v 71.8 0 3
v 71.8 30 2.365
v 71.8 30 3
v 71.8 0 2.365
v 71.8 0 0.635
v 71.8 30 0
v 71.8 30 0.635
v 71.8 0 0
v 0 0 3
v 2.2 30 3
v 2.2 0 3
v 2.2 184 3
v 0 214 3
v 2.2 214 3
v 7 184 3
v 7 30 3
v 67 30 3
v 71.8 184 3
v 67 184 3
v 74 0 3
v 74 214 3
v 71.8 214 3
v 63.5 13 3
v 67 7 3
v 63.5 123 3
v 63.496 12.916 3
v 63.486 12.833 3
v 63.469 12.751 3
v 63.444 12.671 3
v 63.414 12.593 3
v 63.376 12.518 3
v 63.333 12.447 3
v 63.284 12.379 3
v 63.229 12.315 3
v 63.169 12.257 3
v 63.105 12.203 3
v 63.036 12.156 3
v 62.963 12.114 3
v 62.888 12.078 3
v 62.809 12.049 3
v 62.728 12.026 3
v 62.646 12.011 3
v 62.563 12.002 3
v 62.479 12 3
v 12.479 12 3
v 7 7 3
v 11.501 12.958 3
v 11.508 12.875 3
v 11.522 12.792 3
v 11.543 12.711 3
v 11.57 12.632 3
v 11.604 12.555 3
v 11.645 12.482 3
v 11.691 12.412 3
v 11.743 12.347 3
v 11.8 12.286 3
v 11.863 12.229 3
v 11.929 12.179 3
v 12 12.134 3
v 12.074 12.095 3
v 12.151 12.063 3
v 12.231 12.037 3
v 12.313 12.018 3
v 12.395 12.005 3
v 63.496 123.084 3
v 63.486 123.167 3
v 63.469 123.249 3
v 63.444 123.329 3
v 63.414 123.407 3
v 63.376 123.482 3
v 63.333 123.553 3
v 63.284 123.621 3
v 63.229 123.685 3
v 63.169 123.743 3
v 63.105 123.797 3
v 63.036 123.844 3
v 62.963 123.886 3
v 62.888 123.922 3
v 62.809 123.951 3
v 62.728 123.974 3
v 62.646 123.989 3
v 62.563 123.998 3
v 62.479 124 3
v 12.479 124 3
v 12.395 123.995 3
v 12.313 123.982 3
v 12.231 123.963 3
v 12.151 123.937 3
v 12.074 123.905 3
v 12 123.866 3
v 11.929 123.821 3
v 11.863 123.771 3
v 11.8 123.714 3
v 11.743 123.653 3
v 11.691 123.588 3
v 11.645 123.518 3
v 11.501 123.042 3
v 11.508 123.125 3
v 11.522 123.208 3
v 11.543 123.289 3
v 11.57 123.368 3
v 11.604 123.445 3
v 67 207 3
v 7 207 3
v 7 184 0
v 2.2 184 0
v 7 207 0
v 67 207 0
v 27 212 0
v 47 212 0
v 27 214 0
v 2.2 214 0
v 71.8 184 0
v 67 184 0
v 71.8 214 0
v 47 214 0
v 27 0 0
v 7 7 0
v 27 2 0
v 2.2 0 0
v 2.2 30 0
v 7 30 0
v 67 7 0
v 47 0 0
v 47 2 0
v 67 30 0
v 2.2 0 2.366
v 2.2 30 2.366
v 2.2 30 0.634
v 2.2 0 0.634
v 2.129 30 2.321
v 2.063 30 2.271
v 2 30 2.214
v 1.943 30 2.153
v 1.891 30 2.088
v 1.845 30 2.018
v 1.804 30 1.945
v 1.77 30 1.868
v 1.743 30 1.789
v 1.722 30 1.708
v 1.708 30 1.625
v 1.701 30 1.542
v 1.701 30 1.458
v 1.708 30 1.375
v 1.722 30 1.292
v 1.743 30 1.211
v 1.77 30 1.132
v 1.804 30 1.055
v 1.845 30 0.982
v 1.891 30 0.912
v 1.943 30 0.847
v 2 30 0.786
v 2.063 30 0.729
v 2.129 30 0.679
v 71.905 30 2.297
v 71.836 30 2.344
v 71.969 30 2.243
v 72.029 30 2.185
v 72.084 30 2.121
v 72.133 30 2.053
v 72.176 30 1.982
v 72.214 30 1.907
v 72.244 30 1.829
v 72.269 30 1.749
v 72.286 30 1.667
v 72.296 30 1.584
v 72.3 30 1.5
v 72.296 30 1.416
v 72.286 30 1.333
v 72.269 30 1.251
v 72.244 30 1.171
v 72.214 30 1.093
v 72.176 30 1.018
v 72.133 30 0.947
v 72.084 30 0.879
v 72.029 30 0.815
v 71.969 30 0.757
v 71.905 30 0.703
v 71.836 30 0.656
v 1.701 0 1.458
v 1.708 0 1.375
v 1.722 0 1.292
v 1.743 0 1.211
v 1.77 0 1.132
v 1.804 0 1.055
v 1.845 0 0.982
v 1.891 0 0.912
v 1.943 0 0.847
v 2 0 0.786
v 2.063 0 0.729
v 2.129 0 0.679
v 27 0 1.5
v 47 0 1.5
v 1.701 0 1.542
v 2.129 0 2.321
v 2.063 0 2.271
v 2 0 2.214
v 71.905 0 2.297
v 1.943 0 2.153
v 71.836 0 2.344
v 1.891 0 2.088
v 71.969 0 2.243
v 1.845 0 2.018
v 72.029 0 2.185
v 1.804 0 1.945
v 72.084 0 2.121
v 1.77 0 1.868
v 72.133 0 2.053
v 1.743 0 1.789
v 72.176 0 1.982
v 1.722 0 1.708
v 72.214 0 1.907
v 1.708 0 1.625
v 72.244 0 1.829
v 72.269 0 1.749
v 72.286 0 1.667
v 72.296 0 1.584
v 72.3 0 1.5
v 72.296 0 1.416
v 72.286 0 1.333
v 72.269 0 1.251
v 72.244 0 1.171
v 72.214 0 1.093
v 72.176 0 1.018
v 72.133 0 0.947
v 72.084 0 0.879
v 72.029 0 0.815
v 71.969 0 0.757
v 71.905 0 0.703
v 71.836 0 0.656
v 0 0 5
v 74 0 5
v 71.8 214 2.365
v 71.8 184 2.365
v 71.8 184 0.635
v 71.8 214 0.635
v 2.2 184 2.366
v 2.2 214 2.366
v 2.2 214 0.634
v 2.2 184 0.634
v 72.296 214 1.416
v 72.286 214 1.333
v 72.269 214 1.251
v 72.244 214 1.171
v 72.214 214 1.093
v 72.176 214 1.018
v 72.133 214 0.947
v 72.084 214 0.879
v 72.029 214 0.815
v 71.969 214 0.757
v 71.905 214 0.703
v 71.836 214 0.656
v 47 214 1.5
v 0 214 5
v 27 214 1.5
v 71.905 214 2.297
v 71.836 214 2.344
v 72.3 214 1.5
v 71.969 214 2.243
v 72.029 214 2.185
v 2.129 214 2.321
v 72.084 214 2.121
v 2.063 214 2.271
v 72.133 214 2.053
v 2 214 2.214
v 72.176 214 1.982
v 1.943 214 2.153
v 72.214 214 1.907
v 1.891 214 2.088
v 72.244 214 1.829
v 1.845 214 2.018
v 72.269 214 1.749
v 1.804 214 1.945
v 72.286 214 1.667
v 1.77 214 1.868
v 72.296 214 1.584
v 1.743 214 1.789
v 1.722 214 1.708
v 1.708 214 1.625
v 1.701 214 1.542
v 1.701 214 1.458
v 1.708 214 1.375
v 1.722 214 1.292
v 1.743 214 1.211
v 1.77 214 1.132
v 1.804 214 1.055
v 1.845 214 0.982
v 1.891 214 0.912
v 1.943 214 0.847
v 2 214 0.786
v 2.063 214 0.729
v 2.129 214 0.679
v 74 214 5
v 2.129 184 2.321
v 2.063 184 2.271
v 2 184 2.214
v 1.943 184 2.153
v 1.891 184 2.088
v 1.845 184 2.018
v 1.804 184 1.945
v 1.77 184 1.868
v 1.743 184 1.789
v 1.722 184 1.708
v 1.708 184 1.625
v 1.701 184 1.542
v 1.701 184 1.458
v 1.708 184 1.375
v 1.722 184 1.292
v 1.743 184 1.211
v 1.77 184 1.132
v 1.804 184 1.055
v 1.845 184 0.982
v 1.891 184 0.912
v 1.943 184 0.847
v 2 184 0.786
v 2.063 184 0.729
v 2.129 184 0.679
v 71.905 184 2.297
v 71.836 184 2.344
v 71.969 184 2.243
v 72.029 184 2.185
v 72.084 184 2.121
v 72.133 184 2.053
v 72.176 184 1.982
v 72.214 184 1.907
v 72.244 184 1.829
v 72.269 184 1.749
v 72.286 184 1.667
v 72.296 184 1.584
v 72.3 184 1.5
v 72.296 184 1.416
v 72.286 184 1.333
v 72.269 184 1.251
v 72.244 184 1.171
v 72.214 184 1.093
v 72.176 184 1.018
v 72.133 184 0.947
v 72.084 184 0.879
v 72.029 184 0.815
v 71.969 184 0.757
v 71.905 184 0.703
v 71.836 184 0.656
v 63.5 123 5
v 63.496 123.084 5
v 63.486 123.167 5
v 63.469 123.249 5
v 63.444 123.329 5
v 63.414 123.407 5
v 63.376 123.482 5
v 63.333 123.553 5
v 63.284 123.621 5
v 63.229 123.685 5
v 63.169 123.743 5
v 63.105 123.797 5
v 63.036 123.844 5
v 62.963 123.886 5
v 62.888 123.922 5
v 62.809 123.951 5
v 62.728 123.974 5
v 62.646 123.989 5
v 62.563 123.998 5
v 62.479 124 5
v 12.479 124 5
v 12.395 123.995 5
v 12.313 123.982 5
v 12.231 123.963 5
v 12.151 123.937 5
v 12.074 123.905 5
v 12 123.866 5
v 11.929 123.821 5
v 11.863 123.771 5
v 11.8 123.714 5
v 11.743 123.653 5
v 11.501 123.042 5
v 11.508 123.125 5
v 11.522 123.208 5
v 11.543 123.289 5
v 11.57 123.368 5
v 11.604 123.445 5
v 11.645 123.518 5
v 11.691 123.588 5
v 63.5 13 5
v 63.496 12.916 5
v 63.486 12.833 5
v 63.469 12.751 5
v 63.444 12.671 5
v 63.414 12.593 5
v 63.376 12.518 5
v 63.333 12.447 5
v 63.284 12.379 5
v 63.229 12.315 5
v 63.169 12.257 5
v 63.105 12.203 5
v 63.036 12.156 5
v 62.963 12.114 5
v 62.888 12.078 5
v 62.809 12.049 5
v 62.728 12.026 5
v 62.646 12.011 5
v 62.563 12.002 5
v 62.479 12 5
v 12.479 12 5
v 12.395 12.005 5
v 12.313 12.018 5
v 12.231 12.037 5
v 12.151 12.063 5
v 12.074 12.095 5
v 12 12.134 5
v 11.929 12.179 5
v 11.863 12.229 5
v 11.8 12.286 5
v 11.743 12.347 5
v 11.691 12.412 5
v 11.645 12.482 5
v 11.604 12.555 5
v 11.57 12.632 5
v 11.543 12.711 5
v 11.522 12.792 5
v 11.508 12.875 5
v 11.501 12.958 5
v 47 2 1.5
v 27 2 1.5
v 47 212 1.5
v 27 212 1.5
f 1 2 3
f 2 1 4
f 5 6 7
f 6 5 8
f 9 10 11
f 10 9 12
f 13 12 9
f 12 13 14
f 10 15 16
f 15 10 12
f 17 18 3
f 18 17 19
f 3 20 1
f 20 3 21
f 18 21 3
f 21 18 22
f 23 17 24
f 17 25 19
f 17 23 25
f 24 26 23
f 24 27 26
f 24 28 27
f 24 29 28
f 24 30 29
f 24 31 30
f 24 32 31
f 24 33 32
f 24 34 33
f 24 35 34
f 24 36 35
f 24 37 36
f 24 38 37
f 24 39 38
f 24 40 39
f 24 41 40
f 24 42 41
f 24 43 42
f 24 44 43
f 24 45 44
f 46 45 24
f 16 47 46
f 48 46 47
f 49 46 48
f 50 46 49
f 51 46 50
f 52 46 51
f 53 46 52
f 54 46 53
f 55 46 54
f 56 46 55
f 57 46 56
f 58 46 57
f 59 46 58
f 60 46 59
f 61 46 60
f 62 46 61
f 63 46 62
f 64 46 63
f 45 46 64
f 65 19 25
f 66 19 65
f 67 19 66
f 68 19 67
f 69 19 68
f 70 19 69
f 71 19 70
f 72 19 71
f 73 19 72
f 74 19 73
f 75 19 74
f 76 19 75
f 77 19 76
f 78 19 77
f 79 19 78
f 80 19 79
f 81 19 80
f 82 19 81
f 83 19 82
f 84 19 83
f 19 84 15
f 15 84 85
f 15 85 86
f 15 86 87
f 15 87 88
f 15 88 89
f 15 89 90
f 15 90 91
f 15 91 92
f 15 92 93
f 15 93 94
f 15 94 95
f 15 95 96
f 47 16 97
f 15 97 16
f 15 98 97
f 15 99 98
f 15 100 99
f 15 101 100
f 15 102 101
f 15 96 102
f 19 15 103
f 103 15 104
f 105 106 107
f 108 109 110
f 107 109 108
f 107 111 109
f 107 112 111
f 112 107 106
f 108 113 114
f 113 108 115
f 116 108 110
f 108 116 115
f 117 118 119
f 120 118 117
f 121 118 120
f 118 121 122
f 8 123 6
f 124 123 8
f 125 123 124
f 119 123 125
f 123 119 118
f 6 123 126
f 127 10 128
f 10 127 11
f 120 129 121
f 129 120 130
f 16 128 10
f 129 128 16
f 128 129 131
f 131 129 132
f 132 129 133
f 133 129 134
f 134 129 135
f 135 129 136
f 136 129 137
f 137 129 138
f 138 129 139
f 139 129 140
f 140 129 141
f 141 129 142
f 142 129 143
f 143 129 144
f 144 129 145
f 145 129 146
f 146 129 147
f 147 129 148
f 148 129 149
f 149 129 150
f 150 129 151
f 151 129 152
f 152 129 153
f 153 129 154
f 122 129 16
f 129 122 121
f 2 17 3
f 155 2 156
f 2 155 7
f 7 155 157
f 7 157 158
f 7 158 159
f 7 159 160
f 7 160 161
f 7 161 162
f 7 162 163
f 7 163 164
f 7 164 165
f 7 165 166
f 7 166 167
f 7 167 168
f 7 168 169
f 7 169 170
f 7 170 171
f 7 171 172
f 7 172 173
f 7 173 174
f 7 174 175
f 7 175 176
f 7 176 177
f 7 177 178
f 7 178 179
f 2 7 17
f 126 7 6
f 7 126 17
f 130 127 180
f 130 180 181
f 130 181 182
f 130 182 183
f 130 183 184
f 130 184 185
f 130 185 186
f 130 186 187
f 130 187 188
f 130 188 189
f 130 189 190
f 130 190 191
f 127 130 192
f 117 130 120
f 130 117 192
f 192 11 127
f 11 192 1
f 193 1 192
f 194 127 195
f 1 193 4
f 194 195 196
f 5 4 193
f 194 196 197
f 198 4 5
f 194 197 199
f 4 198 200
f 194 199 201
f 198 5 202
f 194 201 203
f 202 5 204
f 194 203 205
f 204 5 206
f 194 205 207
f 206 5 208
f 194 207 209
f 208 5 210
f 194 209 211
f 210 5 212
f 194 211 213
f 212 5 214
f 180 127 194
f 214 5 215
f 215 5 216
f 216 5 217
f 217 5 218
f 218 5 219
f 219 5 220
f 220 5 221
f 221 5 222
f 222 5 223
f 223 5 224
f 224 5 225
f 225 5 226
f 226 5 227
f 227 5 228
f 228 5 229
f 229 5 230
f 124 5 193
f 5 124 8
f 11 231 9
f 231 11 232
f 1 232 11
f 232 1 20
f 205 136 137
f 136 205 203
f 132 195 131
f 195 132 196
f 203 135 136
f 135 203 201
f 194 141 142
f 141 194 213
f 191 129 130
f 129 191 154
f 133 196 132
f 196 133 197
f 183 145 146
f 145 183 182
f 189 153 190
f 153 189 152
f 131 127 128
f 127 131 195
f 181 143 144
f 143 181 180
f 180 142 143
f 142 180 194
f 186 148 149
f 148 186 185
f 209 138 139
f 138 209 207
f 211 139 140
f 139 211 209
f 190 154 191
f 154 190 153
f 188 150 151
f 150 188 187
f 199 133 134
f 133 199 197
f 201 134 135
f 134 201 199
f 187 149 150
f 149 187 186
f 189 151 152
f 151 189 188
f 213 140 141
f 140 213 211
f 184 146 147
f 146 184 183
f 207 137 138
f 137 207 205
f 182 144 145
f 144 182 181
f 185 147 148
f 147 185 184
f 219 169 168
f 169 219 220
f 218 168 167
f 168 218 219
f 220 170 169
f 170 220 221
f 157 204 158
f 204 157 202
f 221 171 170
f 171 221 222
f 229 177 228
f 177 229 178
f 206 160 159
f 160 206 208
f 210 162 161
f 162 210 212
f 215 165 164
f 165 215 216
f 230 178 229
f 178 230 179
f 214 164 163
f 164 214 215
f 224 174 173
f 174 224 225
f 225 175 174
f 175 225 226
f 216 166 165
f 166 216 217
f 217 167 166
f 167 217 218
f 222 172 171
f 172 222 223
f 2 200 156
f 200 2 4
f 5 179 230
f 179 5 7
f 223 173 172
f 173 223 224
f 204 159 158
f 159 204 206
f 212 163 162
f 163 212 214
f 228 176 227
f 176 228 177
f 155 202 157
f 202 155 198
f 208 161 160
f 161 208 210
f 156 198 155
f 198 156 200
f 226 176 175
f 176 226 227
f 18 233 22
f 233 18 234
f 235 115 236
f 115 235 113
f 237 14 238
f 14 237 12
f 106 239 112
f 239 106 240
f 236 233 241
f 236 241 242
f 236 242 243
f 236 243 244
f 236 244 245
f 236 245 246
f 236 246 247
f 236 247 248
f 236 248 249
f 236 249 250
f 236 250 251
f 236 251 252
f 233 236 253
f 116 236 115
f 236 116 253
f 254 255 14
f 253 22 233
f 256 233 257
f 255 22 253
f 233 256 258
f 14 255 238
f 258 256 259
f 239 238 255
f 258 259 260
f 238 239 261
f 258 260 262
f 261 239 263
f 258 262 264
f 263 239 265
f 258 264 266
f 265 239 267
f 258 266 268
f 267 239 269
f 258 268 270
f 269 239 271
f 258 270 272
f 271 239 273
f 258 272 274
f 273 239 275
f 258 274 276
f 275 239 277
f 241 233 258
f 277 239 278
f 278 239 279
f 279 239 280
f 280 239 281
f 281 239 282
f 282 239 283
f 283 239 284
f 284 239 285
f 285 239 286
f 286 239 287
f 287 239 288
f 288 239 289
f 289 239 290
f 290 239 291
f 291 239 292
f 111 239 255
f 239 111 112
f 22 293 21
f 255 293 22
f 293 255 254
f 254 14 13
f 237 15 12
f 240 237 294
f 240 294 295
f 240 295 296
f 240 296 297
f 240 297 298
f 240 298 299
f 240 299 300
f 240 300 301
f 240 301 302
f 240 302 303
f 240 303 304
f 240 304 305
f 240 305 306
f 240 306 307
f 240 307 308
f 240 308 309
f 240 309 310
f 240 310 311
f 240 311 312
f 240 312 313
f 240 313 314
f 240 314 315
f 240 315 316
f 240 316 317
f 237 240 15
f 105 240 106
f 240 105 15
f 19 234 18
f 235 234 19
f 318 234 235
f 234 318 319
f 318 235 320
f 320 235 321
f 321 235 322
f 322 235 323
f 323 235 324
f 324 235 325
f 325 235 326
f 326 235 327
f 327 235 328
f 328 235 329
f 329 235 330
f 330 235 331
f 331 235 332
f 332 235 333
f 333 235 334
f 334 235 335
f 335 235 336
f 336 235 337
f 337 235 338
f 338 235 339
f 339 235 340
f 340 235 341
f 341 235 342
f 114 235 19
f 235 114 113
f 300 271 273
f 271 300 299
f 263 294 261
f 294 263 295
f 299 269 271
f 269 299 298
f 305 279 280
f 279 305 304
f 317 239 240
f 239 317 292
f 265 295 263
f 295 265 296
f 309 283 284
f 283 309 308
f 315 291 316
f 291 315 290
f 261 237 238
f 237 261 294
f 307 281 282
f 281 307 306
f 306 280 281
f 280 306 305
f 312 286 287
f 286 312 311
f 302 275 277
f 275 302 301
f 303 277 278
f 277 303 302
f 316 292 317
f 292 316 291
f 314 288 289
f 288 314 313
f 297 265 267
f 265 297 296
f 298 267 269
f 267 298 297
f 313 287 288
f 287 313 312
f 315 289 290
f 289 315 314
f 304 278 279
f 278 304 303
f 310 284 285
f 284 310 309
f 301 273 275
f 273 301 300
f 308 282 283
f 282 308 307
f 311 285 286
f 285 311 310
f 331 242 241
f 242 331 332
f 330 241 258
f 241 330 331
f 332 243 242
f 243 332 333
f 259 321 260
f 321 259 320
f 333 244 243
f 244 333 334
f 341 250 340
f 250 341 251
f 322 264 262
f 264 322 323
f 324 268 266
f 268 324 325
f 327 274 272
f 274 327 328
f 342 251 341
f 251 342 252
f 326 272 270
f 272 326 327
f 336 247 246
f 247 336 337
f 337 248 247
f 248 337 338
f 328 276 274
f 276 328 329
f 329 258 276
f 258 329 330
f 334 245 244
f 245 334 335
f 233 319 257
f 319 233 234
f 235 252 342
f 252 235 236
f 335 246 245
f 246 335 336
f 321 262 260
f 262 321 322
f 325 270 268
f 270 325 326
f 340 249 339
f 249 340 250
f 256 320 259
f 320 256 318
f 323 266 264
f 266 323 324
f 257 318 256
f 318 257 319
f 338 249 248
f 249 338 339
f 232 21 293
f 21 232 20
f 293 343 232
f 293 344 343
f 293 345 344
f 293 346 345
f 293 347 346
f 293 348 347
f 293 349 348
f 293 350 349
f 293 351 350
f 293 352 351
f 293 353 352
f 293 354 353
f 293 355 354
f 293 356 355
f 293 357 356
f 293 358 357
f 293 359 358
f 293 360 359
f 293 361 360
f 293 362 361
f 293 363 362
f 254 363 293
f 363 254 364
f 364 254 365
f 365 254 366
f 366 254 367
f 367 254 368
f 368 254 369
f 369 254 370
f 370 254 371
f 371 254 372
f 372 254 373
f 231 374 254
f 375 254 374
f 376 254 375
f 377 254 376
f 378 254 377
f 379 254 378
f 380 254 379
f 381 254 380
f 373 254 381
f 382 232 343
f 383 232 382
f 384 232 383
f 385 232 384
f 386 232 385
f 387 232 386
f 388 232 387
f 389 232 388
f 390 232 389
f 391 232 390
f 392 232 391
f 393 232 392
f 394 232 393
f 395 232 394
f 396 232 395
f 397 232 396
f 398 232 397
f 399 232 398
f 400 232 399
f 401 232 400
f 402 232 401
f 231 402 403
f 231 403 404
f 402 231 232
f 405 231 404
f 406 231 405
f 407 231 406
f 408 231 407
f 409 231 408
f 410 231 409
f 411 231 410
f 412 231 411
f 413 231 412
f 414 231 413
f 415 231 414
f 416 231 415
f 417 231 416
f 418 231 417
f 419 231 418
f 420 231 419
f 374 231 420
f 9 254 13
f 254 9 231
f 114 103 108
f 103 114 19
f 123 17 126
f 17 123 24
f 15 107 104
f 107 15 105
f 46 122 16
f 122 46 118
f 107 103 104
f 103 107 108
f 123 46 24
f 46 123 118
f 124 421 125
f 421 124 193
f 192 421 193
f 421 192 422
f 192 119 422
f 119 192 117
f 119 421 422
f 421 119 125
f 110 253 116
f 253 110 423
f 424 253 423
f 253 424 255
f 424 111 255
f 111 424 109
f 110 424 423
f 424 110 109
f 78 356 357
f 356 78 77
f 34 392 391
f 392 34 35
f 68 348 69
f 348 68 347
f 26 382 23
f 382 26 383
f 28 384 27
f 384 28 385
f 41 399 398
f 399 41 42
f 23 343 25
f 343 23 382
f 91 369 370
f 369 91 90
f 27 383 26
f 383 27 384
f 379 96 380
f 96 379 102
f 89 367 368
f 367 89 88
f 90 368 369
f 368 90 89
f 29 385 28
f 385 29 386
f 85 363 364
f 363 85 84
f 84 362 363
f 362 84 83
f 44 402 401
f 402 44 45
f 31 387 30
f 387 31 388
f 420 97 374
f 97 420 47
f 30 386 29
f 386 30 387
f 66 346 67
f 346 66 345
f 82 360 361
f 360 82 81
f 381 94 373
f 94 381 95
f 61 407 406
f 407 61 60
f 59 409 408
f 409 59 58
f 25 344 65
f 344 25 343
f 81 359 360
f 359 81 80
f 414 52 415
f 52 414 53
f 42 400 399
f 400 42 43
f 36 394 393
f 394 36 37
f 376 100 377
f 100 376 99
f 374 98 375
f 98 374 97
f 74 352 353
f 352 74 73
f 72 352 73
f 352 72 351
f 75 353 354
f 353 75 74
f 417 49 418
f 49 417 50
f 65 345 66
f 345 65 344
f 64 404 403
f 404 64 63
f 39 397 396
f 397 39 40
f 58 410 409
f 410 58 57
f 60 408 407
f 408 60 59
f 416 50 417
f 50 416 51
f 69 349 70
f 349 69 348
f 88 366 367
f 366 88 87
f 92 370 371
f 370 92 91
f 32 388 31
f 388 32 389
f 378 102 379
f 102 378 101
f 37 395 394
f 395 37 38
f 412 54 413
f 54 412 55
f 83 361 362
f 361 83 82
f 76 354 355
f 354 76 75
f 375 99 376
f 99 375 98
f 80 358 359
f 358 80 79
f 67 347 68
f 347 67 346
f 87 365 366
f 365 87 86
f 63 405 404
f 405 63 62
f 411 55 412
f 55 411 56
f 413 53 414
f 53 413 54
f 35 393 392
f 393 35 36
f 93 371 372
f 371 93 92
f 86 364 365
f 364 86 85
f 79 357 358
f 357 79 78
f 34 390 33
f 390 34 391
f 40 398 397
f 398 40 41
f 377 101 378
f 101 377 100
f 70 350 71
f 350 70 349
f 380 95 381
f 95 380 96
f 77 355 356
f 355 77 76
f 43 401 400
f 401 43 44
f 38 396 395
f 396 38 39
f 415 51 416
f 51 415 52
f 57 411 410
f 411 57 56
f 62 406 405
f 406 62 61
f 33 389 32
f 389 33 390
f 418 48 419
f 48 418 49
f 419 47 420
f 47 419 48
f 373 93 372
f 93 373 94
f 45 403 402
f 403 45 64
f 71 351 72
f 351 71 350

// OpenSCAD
$fn=75;
extra=0.1; //debug parameter

/* inner case parameters */
caseX=70;
caseY=210;
caseZ=80;

/* wall thickness will be added to each side */
wallThickness=2;

snapInBlockY=30;
snapInBlockZ=1.5;

/* this gives a clearance for the snapInBlocks to be cutout.
   only for lid part. it cuts out some material from the snapInBlocks
   to save some filament. */
snapInBlockClearance=5;

lidThickness=2;
/* snapIn bulge radius */
lidFixRad=1;
lidFixXMov=0.5;

lidClearance = 0.2;

screwPlateY=10;
screwPlateZ=4;

screwR=3.2/2;
screwHeadR=5/2;

pocketX = 20;

module paramCase(screwPlateUpDown = false)
{
  difference() {
    cube([caseX+wallThickness*2,caseY+wallThickness*2,caseZ+snapInBlockZ*2+wallThickness]);
    translate([wallThickness,wallThickness,wallThickness]) cube([caseX,caseY,caseZ+snapInBlockZ*2+extra]);

    /* place cutout for left side into this module */
    cutoutLeft();

    /* place cutout for right side into this module */
    cutoutRight();

    /* place cutout for head side into this module */
    cutoutBack();

    /* place cutout for bottom side into this module */
    cutoutFront();

    /* fixBlock */
    translate([wallThickness,0,caseZ+wallThickness])
      lidFixBlock(lidPart = false);
    translate([wallThickness,caseY+wallThickness*2-snapInBlockY,caseZ+wallThickness])
      lidFixBlock(lidPart = false);
  }

  if(screwPlateUpDown == true)
  {
    translate([0,-screwPlateY,0]) screwPlate();
    translate([0,caseY+wallThickness*2,0]) screwPlate();
  }
}

/* return clearence parameter for lidFixBlocks to separate between cutout from case
and actual lid part */
function getLidClearance(lid = true) = (lid==true) ? lidClearance : 0;
module lidFixBlock(lidPart = true)
{
  union()
  {
    translate([getLidClearance(lidPart),0,0])
      cube([caseX-getLidClearance(lidPart)*2,snapInBlockY,snapInBlockZ*2]);
    translate([lidFixXMov+getLidClearance(lidPart),0,snapInBlockZ]) rotate([-90,0,0])
      cylinder(r=lidFixRad,h=snapInBlockY);
    translate([caseX-lidFixXMov-getLidClearance(lidPart),0,snapInBlockZ]) rotate([-90,0,0])
      cylinder(r=lidFixRad,h=snapInBlockY);
  }
}
/* lidFixBlock(); */

module cutoutLeft()
{

}

module cutoutRight()
{

}

module cutoutBack()
{
  /* translate([wallThickness,caseY+wallThickness,wallThickness+pcbZ-pcbThickness])
    cube([caseX,wallThickness,potiZ+pcbThickness]); */
}

module cutoutFront()
{

}

module cutoutLid()
{
  windowX = 50;
  windowY = 110;
  windowPosX = 0;
  windowPosY = -40;

  translate([windowPosX,windowPosY,0])
  #translate([caseX/2+wallThickness-(50+1)/2,caseY/2+wallThickness-windowY/2,0])
  translate([1,1,snapInBlockZ*2])
  minkowski() {
    cube([windowX,windowY,lidThickness]);
    cylinder(r=1,h=0.0000001);
  }
}

/* cutoutLid(); */

module screwPlate()
{
  difference() {
    cube([caseX+wallThickness*2,screwPlateY,wallThickness]);
    translate([(caseX+wallThickness*2)/2,screwPlateY/2,wallThickness/2]) cylinder(r1=screwR,r2=screwHeadR,h=wallThickness/2);
    translate([(caseX+wallThickness*2)/2,screwPlateY/2,0]) cylinder(r=screwR,h=wallThickness/2);
  }
}
/* translate([0,-screwPlateY,0]) screwPlate(); */

module paramCaseLid(cutoutLidEnable = false)
{
  difference()
  {
    union()
    {
      /* lid */
      translate([0,0,snapInBlockZ*2]) cube([caseX+wallThickness*2,caseY+wallThickness*2,wallThickness]);

      /* fixation block will be cut out from wall */
      translate([wallThickness,0,0])
        lidFixBlock();
      /* fixation block will be cut out from wall */
      translate([wallThickness,caseY+wallThickness*2-snapInBlockY,0])
        lidFixBlock();
    } /* union lid */
    /* cutout for snapInBlocks to save some filament */
    translate([wallThickness+snapInBlockClearance,wallThickness+snapInBlockClearance,0])
      cube([(caseX-snapInBlockClearance*2),(caseY-snapInBlockClearance*2),snapInBlockZ*2]);

    /* cutout a pocket in the lid to enable easier opening with fingers */
    translate([caseX/2+wallThickness-pocketX/2,/*wallThickness+snapInBlockClearance*/0,0])
      cube([pocketX,wallThickness,snapInBlockZ]);
    translate([caseX/2+wallThickness-pocketX/2,caseY+wallThickness,0])
      cube([pocketX,wallThickness,snapInBlockZ]);

    if(cutoutLidEnable == true)
      cutoutLid();
  }
}

/* paramCase(); */

/* translate([-10,0,lidThickness+snapInBlockZ*2])
rotate([0,180,0]) */
/* translate([0,0,22]) */
/* paramCaseLid(); */

paramCaseLid(true);
